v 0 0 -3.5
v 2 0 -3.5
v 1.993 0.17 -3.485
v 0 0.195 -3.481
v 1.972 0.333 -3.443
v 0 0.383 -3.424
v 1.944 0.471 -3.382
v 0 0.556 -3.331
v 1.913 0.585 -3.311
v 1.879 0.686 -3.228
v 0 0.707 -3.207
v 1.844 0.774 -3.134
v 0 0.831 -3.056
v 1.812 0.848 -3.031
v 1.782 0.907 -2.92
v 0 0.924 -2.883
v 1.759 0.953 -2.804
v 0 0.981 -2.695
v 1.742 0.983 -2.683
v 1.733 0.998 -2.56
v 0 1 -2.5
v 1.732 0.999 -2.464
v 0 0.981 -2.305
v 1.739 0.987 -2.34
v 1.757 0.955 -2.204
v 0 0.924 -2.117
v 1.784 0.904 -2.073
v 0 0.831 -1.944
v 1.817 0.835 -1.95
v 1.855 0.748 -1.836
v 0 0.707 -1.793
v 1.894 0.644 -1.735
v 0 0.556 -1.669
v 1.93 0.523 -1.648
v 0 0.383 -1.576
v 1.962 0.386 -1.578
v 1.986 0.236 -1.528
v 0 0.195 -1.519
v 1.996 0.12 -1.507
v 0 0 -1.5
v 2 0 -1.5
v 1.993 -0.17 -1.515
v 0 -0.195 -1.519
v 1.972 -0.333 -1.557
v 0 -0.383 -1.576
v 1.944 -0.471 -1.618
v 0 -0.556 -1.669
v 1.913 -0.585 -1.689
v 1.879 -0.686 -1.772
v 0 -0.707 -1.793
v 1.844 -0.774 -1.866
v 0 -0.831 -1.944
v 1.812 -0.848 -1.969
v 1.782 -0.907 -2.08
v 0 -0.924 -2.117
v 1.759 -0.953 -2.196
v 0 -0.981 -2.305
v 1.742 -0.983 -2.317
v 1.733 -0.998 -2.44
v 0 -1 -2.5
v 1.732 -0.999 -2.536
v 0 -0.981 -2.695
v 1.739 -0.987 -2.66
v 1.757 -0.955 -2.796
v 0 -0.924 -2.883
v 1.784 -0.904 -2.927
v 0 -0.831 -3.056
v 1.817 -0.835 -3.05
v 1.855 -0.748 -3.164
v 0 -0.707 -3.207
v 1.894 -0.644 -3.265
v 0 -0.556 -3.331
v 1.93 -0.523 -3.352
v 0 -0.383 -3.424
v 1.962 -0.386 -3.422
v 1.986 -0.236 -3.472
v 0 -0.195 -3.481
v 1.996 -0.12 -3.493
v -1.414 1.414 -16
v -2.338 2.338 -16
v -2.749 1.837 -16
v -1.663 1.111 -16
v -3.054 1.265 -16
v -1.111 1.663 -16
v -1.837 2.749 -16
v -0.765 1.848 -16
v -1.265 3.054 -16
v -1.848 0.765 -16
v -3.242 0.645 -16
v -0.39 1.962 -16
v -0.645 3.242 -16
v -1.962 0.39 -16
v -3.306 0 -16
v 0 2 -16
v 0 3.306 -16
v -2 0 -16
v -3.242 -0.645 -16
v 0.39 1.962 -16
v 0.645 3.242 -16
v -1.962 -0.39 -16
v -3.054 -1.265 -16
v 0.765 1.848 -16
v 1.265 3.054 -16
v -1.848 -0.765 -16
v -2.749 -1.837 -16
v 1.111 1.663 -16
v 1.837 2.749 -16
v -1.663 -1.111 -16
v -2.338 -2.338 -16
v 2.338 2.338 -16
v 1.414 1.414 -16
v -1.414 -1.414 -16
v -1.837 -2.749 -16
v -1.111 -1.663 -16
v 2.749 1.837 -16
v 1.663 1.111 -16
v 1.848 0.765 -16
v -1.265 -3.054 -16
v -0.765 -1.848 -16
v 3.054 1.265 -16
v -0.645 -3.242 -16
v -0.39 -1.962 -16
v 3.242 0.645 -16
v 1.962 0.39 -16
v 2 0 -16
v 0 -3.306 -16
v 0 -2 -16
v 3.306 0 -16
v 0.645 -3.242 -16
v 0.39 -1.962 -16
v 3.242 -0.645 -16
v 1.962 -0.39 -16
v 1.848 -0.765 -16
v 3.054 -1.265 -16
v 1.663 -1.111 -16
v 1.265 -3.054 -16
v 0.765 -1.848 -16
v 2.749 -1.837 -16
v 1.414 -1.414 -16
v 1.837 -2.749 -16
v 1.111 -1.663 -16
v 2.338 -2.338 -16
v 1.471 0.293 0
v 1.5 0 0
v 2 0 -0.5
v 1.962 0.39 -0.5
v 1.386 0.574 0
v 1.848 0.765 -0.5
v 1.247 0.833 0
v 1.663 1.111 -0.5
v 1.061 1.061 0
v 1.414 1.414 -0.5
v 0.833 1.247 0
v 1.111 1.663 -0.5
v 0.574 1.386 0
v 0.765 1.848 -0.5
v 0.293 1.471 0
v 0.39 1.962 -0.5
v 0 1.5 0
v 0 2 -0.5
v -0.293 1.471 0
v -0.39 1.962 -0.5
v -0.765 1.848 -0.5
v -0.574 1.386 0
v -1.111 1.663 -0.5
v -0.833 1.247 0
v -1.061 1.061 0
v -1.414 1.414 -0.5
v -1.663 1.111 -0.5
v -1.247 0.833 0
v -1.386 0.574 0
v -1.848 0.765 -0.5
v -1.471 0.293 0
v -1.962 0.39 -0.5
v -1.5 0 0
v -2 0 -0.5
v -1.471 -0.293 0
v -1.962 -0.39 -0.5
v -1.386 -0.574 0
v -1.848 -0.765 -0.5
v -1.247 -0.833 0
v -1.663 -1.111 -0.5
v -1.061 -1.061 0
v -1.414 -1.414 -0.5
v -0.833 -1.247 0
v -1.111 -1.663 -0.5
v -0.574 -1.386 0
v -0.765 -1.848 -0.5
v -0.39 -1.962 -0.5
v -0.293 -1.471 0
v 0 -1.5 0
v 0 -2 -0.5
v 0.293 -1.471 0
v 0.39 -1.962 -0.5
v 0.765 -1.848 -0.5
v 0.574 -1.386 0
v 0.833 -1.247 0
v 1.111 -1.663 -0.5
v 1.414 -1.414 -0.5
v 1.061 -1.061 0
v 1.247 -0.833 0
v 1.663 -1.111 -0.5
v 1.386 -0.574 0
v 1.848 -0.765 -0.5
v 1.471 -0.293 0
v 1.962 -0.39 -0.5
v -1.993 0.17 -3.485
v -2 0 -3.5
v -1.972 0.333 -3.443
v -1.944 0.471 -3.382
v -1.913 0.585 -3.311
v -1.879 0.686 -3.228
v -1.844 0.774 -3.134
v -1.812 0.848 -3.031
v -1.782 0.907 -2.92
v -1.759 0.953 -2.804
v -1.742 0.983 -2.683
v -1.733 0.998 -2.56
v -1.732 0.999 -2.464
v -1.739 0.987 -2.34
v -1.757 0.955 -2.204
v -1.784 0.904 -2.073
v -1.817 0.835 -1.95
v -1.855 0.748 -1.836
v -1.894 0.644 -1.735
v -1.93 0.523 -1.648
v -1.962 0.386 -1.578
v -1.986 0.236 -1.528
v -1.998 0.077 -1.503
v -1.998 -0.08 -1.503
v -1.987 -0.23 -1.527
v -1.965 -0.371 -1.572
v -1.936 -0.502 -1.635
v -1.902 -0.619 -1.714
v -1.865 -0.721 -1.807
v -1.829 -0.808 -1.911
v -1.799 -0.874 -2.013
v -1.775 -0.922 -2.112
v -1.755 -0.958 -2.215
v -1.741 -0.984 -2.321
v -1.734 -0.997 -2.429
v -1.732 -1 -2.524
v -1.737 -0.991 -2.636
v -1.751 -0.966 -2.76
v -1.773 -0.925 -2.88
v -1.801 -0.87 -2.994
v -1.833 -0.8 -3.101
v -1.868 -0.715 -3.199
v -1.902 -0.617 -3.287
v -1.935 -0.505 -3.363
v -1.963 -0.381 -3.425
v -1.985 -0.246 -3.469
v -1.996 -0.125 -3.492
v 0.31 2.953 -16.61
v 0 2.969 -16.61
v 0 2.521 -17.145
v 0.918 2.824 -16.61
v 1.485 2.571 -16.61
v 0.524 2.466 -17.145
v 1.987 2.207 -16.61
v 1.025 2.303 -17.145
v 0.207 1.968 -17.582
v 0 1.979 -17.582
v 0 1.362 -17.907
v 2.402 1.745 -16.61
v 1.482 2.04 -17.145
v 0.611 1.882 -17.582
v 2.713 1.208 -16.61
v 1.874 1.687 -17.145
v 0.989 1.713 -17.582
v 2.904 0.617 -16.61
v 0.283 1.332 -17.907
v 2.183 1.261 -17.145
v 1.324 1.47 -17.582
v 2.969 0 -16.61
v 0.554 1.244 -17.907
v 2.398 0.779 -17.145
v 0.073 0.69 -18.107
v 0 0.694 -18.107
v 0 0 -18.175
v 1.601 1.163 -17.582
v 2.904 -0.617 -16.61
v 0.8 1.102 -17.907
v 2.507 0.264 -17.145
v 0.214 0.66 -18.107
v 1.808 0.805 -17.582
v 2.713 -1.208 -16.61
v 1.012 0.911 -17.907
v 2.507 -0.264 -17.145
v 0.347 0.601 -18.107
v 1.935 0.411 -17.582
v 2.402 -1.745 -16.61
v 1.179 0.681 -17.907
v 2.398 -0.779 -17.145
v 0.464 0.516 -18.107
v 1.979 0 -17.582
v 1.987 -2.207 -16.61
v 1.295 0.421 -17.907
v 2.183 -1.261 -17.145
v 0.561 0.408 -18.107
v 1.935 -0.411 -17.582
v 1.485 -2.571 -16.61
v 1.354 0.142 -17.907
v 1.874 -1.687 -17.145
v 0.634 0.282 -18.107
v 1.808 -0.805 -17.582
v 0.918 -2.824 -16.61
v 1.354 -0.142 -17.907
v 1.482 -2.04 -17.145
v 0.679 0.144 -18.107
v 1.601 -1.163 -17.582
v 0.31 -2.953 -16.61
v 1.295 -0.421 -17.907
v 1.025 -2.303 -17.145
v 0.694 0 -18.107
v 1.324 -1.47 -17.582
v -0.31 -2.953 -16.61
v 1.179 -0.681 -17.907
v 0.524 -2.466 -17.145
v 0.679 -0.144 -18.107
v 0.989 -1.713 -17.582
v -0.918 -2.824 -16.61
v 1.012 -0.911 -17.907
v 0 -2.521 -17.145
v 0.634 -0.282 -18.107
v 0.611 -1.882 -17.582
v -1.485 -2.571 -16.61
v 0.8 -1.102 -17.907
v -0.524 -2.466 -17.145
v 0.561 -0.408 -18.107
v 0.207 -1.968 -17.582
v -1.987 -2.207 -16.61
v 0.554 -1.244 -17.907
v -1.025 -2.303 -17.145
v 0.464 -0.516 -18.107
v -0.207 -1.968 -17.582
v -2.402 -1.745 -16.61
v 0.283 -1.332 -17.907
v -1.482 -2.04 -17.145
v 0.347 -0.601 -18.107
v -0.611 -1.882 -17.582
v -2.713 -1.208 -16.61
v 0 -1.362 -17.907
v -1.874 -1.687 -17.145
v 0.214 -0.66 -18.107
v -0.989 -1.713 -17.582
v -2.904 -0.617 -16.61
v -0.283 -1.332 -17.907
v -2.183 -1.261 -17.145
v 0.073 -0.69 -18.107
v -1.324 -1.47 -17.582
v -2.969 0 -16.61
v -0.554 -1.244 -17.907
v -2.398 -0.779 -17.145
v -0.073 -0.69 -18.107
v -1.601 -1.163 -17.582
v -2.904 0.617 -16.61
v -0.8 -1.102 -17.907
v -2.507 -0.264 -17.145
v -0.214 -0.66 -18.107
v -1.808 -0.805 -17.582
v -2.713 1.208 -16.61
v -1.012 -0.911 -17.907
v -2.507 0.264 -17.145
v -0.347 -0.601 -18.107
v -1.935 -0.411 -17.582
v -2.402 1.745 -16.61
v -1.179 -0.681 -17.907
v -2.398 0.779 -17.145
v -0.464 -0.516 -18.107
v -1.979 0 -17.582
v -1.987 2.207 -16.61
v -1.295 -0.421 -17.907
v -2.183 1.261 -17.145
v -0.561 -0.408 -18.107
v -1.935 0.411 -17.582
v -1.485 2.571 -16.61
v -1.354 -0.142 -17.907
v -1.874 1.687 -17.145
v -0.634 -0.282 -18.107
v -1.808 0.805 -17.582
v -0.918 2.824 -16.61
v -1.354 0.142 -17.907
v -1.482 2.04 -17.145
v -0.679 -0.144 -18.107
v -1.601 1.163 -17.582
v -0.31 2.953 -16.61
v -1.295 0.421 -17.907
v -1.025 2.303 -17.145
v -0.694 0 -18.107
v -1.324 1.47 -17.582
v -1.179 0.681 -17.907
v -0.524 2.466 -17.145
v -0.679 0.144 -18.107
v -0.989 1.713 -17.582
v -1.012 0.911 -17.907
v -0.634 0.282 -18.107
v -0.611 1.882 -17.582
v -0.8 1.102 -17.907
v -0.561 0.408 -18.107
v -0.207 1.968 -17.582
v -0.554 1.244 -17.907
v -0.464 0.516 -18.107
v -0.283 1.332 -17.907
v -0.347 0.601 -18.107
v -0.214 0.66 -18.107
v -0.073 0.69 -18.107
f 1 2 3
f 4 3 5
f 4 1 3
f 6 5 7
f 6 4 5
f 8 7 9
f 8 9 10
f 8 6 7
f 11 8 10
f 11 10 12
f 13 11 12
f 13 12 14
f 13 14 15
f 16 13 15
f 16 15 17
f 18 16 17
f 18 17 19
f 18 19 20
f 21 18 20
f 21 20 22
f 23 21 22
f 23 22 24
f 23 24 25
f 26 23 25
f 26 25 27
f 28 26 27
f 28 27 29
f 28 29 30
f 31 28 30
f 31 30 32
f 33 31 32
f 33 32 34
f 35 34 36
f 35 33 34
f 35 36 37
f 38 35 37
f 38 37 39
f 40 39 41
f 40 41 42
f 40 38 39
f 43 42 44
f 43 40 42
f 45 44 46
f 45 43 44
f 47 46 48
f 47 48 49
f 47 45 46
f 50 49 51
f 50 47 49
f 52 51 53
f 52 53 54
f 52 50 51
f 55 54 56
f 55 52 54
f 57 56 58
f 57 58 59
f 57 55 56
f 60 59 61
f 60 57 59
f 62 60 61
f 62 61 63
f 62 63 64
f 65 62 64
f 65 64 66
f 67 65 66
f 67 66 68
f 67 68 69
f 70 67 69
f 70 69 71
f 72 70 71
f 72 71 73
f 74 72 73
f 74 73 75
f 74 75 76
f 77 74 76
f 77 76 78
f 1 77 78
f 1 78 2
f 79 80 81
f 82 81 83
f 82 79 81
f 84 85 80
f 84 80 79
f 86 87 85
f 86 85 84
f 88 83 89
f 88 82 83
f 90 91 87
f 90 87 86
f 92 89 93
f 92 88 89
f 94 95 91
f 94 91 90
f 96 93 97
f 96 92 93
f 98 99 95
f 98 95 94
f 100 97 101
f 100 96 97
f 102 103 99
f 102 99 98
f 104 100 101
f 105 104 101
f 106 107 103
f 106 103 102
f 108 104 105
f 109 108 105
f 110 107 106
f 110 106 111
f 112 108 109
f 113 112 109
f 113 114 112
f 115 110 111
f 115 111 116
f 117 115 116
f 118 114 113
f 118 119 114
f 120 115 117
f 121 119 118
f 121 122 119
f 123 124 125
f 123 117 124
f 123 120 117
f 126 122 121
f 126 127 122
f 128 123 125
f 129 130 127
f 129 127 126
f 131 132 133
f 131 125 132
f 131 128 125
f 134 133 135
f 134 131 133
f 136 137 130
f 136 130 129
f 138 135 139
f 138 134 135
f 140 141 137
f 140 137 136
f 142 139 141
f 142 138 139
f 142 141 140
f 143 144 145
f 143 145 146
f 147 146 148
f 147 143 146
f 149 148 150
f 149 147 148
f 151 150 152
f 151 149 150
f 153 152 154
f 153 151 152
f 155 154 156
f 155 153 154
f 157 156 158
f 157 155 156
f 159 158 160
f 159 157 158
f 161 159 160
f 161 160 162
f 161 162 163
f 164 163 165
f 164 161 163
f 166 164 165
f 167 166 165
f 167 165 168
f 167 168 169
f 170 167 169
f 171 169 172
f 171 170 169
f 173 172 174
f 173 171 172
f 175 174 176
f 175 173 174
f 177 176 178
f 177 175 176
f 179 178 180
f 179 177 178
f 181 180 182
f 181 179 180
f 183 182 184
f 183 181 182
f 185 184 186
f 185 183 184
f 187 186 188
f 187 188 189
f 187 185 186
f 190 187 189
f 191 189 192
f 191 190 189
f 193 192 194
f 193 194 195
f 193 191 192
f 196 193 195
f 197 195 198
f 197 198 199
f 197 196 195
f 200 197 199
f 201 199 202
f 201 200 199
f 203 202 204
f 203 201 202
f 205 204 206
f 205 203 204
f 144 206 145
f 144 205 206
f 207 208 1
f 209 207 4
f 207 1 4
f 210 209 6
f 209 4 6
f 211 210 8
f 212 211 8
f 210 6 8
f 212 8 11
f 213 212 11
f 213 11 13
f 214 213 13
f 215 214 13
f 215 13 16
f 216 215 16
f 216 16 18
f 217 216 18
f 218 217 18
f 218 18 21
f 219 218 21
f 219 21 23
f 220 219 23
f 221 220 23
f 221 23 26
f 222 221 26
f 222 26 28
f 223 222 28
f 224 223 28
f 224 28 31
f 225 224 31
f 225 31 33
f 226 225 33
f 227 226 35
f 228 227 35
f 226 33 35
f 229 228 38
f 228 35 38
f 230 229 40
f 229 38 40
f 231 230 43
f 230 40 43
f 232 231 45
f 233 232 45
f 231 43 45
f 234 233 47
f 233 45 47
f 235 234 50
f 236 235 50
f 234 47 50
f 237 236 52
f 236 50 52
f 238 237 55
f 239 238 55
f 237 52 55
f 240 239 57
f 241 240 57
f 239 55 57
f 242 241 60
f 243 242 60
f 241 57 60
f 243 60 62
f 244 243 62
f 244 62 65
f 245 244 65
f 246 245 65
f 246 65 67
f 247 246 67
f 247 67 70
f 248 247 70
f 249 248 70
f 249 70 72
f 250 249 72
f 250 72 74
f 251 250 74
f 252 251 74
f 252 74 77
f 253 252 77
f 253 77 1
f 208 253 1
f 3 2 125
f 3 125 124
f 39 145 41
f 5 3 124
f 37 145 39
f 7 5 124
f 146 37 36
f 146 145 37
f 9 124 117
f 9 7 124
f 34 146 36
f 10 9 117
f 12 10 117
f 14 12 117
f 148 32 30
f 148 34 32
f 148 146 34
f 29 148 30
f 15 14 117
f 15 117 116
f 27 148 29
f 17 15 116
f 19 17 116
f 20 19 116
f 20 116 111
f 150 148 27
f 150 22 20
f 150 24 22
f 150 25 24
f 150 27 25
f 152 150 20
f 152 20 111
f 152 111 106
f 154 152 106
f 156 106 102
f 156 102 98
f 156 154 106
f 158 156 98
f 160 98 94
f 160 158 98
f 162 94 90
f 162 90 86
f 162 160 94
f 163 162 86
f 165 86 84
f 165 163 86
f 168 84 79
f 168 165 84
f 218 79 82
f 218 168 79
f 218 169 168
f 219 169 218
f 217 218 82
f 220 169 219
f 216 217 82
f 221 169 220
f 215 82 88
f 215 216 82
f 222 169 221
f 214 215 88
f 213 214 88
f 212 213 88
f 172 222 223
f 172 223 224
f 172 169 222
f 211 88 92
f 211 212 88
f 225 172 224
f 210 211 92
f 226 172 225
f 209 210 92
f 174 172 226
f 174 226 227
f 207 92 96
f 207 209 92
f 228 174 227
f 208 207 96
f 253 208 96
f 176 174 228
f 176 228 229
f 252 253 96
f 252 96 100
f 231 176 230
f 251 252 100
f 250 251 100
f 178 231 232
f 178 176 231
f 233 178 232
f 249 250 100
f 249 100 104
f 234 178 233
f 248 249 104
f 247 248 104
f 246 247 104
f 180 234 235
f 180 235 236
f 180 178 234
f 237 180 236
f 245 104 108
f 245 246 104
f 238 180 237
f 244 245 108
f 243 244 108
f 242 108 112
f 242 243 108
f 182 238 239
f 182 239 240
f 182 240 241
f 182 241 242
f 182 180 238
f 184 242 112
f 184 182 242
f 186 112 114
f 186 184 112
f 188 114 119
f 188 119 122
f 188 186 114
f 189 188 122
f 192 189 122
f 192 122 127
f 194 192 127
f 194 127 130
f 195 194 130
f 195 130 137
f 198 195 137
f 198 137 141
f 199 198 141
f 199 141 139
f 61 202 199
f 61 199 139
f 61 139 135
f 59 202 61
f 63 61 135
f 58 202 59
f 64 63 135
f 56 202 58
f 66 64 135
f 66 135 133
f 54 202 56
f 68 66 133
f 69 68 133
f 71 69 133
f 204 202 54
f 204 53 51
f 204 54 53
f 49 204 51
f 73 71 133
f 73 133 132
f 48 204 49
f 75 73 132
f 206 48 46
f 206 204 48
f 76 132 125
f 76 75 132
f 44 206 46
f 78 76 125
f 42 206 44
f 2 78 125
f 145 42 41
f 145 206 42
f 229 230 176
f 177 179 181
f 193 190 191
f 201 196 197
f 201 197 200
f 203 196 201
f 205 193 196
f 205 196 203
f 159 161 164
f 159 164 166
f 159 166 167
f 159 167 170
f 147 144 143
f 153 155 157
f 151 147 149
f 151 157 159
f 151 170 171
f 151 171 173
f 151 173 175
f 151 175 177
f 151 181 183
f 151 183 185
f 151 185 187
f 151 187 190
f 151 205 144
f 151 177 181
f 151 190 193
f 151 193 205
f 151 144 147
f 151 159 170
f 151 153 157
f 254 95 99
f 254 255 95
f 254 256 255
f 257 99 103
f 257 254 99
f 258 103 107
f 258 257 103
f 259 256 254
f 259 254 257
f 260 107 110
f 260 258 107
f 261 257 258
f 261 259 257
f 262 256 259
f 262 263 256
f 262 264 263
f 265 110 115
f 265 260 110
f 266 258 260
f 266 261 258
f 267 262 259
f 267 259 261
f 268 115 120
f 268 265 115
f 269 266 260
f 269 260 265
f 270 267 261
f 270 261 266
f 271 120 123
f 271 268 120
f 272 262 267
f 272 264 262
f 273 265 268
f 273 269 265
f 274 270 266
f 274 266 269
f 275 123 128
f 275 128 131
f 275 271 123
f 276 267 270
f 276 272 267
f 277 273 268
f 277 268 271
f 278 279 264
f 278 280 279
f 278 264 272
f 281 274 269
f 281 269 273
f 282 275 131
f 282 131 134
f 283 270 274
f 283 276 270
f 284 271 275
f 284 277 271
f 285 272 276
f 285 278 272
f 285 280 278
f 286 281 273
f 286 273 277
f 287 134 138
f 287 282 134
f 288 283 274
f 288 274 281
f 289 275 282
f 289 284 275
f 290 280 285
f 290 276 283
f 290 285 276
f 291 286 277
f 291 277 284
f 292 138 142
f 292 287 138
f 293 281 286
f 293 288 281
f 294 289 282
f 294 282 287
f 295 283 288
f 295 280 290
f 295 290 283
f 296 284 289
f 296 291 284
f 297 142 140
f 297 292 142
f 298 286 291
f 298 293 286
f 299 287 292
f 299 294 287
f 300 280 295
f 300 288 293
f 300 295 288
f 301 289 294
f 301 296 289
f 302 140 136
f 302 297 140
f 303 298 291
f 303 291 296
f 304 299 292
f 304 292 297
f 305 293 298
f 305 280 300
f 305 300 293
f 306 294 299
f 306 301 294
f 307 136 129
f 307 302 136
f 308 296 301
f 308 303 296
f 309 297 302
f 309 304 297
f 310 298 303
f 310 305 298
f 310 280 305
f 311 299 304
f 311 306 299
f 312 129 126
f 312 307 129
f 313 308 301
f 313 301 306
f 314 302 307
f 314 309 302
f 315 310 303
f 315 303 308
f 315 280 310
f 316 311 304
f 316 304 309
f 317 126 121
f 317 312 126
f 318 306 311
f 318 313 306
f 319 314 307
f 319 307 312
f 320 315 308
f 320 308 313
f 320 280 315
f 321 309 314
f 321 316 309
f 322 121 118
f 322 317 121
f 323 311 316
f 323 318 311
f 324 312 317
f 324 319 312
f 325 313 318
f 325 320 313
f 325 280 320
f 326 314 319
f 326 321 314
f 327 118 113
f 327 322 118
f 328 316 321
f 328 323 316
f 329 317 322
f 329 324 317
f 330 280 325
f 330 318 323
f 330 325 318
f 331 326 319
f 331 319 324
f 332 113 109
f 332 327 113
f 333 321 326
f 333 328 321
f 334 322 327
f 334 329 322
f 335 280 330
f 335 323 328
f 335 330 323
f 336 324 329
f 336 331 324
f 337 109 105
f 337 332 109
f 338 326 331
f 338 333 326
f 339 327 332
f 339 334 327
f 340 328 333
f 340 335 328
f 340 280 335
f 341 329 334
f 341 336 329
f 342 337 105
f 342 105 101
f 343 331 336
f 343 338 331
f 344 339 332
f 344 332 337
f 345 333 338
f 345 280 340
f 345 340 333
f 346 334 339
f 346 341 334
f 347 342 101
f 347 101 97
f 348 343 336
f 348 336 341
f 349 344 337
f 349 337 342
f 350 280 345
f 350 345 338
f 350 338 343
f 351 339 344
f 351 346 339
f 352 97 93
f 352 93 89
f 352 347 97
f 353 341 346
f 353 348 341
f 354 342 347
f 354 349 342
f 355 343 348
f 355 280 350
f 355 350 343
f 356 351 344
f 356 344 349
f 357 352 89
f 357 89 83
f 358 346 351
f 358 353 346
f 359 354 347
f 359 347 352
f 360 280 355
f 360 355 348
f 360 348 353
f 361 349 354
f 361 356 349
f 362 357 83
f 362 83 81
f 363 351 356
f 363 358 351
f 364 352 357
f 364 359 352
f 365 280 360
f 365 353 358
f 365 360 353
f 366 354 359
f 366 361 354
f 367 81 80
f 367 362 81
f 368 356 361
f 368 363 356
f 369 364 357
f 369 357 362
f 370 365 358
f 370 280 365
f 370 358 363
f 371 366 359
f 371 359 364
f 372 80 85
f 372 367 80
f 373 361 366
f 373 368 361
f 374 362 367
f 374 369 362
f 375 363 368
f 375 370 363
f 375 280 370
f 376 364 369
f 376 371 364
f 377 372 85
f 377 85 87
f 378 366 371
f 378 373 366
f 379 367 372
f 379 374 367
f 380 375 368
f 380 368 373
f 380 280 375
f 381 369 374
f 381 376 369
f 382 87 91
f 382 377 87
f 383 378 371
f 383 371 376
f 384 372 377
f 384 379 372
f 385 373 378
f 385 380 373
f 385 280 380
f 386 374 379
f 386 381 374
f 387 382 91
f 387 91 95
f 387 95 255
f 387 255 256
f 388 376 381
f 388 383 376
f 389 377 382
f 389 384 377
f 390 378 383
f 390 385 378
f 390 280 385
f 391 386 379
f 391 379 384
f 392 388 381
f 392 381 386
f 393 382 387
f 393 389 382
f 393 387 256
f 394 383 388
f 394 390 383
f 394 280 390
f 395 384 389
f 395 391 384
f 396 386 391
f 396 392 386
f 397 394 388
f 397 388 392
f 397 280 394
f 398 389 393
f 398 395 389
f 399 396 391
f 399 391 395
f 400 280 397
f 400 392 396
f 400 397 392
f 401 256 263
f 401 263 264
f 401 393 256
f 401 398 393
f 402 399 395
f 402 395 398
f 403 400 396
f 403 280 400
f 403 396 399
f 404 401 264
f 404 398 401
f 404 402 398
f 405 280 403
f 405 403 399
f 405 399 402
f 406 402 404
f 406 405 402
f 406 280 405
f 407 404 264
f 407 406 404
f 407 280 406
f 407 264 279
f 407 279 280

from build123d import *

# Parameters (mm, degrees)
SKETCH1_R               = 2
BOSS_EXTRUDE1_DEPTH     = 16
CHAMFER1_SIZE           = 0.5
SKETCH7_R               = 1
CUT_EXTRUDE1_DEPTH      = 4.305898307
CUT_EXTRUDE1_DEPTH_BACK = 4.305898307


with BuildPart() as part:
    # Sketch1 → Boss-Extrude1 (new body)
    with BuildSketch(Plane.XY):
        Circle(SKETCH1_R)
    extrude(amount=-BOSS_EXTRUDE1_DEPTH)

    # Chamfer1
    chamfer1_edges = [part.edges().sort_by_distance(p)[0] for p in [
        (-2, 0, 0),
    ]]
    chamfer(chamfer1_edges, length=CHAMFER1_SIZE)

    # Sketch4 → Revolve1 (revolve)
    with BuildSketch(Plane(origin=(0, 0, 0), x_dir=(0, 0, -1), z_dir=(1, 0, 0))):
        with BuildLine():
            Line((16, 0), (16, 3.305898307))
            ThreePointArc((16, 3.305898307), (17.582389504, 1.978570239), (18.174855662, 0))
            Line((18.174855662, 0), (16, 0))
        make_face()
    revolve(axis=Axis((0, 0, -13.297823311), (0, 0, -1)))

    # Sketch7 → Cut-Extrude1 (cut, two sides)
    with BuildSketch(Plane(origin=(0, 0, 0), x_dir=(0, 0, -1), z_dir=(1, 0, 0))) as cut_extrude1_sk:
        with Locations((2.5, 0)):
            Circle(SKETCH7_R)
    extrude(amount=CUT_EXTRUDE1_DEPTH, mode=Mode.SUBTRACT)
    extrude(cut_extrude1_sk.sketch, amount=-CUT_EXTRUDE1_DEPTH_BACK, mode=Mode.SUBTRACT)


solid = part.part
